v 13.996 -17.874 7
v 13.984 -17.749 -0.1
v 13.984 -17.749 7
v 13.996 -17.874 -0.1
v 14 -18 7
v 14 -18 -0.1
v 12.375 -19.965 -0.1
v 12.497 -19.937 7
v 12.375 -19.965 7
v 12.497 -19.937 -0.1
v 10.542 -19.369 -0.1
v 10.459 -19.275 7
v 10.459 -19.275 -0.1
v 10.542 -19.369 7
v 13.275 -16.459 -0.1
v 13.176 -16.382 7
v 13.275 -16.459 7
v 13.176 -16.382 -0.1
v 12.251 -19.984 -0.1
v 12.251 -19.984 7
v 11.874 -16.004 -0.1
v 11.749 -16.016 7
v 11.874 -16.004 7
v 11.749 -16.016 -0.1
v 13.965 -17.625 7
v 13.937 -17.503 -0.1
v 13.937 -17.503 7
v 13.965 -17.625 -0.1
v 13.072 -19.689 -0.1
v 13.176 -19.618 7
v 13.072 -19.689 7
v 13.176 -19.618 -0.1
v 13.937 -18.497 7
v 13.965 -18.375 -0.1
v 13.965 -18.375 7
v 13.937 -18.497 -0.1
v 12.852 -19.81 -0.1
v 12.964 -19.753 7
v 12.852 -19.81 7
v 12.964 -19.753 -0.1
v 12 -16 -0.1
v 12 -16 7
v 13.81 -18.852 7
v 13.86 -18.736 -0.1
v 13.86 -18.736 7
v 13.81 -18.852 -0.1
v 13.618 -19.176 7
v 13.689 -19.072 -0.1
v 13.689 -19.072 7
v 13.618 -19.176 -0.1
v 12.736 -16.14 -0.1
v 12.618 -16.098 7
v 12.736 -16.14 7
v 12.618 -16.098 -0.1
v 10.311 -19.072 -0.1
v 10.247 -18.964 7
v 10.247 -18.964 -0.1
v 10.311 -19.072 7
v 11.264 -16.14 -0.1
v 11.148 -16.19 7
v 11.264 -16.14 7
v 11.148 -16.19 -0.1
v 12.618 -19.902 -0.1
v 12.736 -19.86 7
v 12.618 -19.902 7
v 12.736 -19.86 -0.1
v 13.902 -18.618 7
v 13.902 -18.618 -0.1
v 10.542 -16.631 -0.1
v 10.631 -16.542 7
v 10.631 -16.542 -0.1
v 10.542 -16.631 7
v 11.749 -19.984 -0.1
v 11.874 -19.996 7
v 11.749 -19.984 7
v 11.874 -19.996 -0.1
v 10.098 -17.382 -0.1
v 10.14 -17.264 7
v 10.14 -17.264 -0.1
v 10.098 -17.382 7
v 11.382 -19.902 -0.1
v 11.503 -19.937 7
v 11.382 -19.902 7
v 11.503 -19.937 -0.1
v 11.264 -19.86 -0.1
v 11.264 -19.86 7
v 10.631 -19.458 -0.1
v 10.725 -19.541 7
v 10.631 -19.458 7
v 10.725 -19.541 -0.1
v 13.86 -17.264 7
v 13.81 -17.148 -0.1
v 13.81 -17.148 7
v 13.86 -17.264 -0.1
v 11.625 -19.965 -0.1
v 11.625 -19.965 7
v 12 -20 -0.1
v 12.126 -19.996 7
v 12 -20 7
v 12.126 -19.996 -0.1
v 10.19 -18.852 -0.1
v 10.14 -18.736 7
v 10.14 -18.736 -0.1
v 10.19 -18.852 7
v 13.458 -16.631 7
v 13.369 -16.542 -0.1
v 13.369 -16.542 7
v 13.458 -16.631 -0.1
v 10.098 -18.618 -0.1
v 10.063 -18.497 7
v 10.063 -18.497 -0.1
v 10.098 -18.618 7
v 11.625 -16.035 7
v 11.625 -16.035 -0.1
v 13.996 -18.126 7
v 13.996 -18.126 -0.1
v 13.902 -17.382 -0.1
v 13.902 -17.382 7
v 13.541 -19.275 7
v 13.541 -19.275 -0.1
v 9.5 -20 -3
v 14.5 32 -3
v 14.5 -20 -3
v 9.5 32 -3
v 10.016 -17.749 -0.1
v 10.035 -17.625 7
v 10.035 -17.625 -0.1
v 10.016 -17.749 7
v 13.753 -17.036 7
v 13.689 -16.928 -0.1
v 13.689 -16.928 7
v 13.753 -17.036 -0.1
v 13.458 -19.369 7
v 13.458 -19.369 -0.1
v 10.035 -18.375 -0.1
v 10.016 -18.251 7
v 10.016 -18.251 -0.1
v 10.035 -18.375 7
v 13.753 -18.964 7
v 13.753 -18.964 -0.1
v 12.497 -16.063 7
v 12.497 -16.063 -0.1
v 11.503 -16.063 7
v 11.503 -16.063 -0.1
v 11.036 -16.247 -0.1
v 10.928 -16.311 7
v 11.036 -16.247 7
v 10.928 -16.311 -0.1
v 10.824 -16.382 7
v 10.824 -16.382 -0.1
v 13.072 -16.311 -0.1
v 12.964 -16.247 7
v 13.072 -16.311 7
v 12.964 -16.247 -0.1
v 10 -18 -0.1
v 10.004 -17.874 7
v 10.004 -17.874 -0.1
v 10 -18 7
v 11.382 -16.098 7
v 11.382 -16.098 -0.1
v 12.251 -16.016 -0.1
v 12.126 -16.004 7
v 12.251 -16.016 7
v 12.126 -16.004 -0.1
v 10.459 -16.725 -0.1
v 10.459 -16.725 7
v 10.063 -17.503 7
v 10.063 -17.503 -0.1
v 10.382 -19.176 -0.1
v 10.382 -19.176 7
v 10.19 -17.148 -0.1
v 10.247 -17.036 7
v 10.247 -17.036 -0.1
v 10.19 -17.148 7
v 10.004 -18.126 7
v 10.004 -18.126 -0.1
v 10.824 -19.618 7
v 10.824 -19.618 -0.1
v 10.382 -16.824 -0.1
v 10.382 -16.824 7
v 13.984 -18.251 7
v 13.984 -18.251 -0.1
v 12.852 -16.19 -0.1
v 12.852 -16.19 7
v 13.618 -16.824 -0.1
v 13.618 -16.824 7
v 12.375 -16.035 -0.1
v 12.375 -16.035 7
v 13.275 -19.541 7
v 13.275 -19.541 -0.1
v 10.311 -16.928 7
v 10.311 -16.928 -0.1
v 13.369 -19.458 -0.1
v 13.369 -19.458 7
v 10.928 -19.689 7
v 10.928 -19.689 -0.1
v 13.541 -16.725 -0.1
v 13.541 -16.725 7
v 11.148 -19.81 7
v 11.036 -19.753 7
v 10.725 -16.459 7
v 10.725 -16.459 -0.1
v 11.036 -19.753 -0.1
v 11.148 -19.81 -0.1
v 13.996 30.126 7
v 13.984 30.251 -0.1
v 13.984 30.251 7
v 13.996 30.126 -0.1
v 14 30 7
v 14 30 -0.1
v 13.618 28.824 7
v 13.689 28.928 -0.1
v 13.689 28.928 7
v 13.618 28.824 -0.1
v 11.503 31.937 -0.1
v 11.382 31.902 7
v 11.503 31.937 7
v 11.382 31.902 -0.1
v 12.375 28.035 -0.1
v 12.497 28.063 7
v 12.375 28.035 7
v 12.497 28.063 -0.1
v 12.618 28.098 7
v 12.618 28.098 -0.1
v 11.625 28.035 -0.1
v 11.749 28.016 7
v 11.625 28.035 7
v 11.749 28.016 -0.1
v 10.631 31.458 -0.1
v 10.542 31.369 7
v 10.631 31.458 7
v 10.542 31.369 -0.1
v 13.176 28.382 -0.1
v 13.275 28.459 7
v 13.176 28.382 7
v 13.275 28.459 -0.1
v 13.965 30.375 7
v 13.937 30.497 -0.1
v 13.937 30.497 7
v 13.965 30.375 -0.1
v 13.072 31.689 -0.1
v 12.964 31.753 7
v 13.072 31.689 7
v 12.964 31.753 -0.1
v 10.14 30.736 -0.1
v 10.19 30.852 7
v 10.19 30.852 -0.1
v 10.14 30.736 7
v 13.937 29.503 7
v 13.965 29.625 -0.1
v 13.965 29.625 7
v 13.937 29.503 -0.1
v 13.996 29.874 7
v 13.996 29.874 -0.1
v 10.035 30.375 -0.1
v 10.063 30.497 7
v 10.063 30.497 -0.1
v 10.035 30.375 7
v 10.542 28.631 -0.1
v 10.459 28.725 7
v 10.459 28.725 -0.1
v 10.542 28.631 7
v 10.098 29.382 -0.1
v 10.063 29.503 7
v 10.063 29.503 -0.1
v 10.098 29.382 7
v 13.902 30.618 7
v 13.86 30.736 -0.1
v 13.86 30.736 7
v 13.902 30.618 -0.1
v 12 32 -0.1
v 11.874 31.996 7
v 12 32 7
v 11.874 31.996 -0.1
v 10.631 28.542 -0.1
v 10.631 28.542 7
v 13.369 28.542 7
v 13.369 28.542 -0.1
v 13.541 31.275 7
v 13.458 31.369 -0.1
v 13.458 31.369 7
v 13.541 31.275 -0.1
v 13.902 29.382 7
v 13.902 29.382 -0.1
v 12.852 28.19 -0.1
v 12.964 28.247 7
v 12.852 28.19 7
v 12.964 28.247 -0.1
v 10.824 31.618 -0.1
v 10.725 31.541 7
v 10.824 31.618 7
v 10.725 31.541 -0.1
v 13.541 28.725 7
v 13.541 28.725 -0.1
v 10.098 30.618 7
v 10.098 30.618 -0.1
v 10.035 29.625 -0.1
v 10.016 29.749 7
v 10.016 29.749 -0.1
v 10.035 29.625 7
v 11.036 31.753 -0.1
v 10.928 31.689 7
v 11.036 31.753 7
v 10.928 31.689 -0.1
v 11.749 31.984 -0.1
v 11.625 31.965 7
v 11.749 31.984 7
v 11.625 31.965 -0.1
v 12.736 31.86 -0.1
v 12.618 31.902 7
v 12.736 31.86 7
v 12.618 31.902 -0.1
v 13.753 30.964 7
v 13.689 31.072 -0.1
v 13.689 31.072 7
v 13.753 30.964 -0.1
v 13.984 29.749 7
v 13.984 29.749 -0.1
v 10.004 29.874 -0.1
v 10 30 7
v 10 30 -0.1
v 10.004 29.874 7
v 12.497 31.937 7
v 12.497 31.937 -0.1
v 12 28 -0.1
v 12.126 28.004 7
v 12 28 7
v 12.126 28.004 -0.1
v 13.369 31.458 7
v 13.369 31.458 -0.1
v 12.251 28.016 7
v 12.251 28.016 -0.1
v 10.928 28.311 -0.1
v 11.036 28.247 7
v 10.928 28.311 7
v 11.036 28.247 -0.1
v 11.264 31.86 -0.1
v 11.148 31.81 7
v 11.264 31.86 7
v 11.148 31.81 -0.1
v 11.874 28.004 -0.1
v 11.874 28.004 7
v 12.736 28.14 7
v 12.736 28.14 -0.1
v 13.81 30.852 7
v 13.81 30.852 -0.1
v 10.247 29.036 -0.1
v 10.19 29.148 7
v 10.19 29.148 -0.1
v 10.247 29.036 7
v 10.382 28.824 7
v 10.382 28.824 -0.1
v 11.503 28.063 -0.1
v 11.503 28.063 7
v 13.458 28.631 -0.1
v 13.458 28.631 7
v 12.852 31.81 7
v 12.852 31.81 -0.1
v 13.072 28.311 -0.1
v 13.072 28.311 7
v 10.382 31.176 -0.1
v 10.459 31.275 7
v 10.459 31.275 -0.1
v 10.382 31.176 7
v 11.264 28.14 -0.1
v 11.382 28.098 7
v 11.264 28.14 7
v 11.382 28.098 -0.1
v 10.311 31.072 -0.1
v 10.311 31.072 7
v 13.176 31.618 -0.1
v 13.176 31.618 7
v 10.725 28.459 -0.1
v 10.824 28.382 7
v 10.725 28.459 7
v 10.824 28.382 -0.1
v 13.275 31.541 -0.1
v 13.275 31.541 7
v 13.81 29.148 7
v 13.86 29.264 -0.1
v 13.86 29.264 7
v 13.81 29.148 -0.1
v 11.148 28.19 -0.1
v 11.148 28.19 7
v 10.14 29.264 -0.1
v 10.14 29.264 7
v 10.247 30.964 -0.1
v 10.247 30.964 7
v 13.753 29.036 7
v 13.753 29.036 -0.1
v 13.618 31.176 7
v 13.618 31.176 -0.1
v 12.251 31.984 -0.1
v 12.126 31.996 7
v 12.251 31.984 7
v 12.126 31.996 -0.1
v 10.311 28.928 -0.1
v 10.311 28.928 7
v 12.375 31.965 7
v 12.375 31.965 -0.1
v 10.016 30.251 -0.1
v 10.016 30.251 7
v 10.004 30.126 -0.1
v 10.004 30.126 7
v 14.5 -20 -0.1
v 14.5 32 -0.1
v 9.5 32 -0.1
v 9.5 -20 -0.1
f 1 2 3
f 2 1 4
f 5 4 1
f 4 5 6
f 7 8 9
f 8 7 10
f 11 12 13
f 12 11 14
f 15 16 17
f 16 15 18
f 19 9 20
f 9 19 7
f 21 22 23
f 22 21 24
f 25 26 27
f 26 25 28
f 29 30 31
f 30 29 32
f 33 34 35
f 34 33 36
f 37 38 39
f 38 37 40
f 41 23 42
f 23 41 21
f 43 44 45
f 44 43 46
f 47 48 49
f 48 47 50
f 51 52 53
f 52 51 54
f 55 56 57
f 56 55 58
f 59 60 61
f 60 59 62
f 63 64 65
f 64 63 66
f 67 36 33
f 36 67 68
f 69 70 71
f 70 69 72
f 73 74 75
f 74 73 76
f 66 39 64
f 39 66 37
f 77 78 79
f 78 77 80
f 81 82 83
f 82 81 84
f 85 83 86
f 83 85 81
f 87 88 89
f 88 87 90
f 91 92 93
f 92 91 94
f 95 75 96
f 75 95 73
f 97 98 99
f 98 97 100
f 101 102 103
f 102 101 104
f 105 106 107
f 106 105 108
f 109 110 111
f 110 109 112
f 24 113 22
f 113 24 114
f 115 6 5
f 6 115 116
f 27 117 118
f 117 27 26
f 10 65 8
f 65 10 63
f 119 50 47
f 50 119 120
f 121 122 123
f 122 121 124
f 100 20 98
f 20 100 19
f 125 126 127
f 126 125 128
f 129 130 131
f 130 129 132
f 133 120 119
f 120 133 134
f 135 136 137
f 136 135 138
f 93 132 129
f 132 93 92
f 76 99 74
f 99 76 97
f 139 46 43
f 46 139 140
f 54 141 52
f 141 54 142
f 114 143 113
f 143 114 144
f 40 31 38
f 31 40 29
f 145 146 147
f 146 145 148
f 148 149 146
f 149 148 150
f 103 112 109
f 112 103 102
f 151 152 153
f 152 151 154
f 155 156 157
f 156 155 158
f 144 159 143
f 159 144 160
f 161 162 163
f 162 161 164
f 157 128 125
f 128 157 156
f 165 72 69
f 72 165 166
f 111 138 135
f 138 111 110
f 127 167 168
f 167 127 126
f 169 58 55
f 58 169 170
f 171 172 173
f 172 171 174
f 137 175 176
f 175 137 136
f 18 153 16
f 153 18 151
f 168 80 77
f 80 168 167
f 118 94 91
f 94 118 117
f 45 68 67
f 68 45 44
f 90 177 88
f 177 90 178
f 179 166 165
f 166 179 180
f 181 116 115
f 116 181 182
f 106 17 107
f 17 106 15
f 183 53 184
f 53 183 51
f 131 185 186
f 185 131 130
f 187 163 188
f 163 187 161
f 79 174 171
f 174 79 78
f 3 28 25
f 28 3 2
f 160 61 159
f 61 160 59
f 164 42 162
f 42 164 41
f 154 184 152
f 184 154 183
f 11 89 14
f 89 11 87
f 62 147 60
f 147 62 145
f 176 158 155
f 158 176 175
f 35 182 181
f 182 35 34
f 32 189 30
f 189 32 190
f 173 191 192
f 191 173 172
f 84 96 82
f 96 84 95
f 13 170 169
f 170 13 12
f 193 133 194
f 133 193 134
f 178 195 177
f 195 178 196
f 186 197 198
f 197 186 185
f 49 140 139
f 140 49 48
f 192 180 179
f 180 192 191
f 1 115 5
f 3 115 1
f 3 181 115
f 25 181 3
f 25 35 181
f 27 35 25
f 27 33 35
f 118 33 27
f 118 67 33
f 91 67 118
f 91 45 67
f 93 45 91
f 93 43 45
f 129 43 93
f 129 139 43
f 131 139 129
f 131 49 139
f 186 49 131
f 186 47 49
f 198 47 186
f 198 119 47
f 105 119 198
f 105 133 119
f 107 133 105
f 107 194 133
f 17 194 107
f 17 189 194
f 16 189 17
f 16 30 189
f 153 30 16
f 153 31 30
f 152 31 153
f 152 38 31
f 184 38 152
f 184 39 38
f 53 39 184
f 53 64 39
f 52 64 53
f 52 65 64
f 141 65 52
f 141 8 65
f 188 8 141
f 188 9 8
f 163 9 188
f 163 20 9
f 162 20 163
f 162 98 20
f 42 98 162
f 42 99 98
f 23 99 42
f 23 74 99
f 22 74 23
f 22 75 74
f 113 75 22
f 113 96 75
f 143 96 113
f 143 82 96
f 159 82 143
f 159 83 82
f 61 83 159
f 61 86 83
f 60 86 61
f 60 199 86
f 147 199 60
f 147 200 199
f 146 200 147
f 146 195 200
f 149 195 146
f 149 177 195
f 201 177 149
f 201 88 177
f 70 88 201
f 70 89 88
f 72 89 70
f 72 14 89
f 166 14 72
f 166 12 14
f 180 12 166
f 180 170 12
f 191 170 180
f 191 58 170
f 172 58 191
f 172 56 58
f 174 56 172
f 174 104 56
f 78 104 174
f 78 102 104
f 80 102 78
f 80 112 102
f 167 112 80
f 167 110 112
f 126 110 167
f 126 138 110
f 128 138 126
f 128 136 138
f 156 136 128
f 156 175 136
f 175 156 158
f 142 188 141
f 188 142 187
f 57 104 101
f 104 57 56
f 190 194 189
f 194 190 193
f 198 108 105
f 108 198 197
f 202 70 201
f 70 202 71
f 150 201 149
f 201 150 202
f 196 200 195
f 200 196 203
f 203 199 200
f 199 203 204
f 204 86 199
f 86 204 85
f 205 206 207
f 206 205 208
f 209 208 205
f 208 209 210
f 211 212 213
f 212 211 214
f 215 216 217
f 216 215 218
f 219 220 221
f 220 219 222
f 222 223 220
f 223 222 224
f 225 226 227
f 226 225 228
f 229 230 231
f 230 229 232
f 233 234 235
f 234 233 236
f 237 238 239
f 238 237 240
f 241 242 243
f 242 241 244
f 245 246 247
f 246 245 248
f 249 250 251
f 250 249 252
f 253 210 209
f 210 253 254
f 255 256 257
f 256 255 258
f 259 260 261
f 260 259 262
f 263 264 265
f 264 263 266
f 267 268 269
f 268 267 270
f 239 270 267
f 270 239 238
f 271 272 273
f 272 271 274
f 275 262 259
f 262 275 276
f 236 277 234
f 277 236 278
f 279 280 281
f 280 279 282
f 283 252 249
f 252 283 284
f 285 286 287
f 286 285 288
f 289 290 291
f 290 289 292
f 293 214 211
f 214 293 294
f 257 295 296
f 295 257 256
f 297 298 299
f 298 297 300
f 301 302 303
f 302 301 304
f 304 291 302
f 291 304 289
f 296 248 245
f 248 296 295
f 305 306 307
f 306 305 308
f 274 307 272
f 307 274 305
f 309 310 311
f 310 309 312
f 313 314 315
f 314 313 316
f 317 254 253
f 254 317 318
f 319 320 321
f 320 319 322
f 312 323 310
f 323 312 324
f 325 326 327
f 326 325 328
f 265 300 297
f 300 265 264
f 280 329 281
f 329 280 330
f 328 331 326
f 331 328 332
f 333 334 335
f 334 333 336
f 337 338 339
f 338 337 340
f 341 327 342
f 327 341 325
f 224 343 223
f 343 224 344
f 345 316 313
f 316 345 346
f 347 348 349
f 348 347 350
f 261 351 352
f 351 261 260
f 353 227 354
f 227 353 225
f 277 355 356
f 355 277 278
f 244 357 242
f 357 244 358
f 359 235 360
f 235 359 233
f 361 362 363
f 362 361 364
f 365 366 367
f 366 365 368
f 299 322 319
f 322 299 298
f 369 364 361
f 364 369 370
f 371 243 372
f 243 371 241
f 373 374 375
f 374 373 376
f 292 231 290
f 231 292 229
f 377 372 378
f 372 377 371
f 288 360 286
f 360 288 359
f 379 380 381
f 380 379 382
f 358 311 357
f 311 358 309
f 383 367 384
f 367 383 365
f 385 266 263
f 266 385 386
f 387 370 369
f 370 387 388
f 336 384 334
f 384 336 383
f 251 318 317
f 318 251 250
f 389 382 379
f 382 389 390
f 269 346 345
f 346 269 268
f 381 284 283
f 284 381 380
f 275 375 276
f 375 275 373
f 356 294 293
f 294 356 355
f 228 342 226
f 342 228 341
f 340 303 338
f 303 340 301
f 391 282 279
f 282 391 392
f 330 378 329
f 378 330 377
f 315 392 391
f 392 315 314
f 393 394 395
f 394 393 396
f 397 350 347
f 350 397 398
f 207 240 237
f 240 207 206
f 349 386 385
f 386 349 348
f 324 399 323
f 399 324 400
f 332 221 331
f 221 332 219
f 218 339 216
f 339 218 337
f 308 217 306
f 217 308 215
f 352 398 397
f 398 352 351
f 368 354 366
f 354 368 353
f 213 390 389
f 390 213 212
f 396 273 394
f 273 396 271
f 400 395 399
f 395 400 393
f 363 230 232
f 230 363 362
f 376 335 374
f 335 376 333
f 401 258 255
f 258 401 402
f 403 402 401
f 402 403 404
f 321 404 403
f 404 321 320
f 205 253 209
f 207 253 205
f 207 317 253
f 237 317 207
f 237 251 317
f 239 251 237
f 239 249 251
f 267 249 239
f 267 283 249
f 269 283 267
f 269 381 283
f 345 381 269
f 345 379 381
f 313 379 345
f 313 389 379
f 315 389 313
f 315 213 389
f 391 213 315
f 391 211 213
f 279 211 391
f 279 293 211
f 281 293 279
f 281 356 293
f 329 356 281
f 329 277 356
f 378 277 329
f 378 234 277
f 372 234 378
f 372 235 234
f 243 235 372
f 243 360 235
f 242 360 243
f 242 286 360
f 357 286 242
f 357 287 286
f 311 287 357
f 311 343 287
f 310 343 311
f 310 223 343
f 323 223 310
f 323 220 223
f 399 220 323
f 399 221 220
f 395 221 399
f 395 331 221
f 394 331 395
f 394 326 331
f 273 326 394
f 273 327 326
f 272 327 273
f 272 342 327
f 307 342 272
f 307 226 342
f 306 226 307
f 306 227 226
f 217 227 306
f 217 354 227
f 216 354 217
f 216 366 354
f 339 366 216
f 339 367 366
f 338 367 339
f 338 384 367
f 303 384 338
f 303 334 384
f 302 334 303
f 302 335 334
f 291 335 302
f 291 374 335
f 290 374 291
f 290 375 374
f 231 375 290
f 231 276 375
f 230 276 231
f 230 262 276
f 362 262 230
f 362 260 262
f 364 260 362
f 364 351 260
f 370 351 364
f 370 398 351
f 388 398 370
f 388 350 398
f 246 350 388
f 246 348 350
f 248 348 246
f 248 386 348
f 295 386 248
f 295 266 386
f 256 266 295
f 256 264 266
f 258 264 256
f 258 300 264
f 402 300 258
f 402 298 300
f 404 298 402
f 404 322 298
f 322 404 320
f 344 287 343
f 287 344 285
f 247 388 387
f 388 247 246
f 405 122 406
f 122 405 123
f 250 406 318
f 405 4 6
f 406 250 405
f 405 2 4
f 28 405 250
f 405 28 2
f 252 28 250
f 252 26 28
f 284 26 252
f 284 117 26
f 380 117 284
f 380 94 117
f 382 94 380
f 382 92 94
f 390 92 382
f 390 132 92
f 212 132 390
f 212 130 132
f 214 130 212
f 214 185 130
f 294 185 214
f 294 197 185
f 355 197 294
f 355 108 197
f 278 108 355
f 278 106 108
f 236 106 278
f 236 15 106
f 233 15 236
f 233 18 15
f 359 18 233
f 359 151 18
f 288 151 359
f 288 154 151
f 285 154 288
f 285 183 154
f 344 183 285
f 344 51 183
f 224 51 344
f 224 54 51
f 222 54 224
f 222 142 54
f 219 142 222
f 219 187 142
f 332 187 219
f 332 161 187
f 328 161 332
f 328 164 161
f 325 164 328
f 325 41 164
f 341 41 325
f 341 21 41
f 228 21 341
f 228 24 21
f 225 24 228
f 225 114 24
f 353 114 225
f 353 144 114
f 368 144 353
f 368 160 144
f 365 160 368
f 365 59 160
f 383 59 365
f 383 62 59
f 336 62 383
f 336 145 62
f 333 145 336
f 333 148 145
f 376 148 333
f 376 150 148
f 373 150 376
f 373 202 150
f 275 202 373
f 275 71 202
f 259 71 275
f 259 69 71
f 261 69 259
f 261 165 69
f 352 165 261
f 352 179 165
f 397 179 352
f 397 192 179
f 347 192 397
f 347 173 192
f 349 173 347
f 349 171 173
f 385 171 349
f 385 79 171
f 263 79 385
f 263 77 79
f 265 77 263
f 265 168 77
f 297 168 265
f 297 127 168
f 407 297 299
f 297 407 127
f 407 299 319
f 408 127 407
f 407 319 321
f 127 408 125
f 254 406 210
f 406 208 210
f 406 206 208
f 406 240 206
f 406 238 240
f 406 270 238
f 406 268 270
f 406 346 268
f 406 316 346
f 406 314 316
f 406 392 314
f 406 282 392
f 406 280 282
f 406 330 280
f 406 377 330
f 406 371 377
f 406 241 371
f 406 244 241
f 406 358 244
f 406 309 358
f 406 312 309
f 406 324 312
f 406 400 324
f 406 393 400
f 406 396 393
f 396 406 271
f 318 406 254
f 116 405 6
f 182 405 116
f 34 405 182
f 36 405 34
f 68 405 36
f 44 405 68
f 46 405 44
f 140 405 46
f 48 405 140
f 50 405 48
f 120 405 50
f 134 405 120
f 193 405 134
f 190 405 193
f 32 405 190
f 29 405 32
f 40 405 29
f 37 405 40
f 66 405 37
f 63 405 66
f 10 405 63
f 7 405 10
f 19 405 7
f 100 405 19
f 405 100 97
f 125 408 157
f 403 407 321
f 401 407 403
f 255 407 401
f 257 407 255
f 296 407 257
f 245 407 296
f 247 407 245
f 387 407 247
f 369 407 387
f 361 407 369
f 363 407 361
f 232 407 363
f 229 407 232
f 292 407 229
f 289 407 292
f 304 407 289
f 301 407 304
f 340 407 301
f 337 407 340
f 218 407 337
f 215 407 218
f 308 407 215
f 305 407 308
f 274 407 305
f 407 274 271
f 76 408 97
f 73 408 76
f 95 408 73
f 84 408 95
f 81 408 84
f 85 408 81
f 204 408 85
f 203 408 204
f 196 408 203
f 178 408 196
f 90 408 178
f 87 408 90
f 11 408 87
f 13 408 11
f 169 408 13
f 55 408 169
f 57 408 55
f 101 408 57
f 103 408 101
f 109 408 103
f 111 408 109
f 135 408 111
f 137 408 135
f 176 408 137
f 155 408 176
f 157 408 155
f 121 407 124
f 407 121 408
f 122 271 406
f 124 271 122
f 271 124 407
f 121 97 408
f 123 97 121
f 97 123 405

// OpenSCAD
$fn=100;

size = 1;

//translate([12*size - 5.5,0,-23.5]) mg90s();
//translate([-7,0,0]) mount();

//eyes();
translate([12*size,6,0]) {
    //translate([0,0,6]) pupils();
    pupils_rail();
}

//pupil();

module eyes() {
    difference() {
        union() {
            difference() {
                union() {
                    translate([0,-30*size,0]) rotate([0,0,8]) scale([1,.67,1]) cylinder(h=10,d=100*size);
                    translate([0,30*size,0]) rotate([0,0,-8]) scale([1,.67,1]) cylinder(h=10,d=100*size);
                }
                translate([2*size,-30*size,5]) rotate([0,0,8]) scale([1,.67,1]) cylinder(h=10,d=83*size);
                translate([2*size,30*size,5]) rotate([0,0,-8]) scale([1,.67,1]) cylinder(h=10,d=83*size);
                
                translate([12*size,-24*size,-1]) rotate([0,0,0]) cylinder(h=10,d=17);
                translate([12*size,24*size,-1]) rotate([0,0,0]) cylinder(h=10,d=17);
            }
            translate([12*size,-24*size,0]) rotate([0,0,0]) cylinder(h=4.99,d=7.5);
            translate([12*size,24*size,0]) rotate([0,0,0]) cylinder(h=4.99,d=7.5);
            translate([12*size-9,-(100*size)/2,0]) cube([8,100*size,4.99]);
        }
        groove_size = 1;
        for(i=[-100:10:100]) {
            translate([i,100,0]) rotate([90,0,0]) rotate([0,0,45]) translate([-groove_size/2,-groove_size/2,0]) cube([groove_size,groove_size,200]);
        }
    }
}

module pupil() {
    difference() {
        scale([1,.67,1]) cylinder(h=3,d=43*size);
        translate([0,0,2]) scale([1,.67,1]) cylinder(h=10,d=29*size);
        translate([0,0,-.01]) cylinder(h=1, d=4);
    }
}

module pupils() {
    translate([0,-24*size,0]) pupil();
    translate([0,24*size,0]) pupil();
}

module pupils_rail() {
    translate([0,-24*size,-3]) rotate([0,0,0]) cylinder(h=10,d=4);
    translate([0,24*size,-3]) rotate([0,0,0]) cylinder(h=10,d=4);
    
    translate([-2.5,-(52*size)/2,-3]) cube([5,52*size,2.9]);
}

module mount() {
    translate([-3,-10,-12.5]) cube([13,20,12.5]);
    translate([-4,-10,-14]) cube([6,20,14]);
    //translate([-0.55,0,-17]) cylinder(h=3,d=1.8);
    translate([-3,-10,-14]) cube([33,3.5,4]);
    translate([-3,10-3.5,-14]) cube([33,3.5,4]);
    translate([25.5,-10,-14]) cube([4.5,20,4]);
    //translate([27.55,0,-17]) cylinder(h=3,d=1.8);
}

module mg90s(){
	difference(){			
		union(){
			color("blue") cube([23,12.5,22], center=true);
			color("blue") translate([0,0,8.2]) cube([32,12.5,2.6], center=true);
			color("blue") translate([5.5,0,2.75]) cylinder(r=6, h=25.75, $fn=20, center=true);
			color("blue") translate([-.5,0,2.75]) cylinder(d=5.5, h=25.75, $fn=20, center=true);	
			color("white") translate([5.5,0,3.65]) cylinder(r=2.35, h=29.25, $fn=20, center=true);				
		}
		
		for ( hole = [14,-14] ){
			translate([hole,0,8.2]) cylinder(d=2, h=4, $fn=20, center=true);
            translate([hole,0,8.2]) cube(d=2, h=4);
		}	
        translate([14,-.5,3]) cube([10,1,10]);
        translate([-24,-.5,3]) cube([10,1,10]);
	}
}
